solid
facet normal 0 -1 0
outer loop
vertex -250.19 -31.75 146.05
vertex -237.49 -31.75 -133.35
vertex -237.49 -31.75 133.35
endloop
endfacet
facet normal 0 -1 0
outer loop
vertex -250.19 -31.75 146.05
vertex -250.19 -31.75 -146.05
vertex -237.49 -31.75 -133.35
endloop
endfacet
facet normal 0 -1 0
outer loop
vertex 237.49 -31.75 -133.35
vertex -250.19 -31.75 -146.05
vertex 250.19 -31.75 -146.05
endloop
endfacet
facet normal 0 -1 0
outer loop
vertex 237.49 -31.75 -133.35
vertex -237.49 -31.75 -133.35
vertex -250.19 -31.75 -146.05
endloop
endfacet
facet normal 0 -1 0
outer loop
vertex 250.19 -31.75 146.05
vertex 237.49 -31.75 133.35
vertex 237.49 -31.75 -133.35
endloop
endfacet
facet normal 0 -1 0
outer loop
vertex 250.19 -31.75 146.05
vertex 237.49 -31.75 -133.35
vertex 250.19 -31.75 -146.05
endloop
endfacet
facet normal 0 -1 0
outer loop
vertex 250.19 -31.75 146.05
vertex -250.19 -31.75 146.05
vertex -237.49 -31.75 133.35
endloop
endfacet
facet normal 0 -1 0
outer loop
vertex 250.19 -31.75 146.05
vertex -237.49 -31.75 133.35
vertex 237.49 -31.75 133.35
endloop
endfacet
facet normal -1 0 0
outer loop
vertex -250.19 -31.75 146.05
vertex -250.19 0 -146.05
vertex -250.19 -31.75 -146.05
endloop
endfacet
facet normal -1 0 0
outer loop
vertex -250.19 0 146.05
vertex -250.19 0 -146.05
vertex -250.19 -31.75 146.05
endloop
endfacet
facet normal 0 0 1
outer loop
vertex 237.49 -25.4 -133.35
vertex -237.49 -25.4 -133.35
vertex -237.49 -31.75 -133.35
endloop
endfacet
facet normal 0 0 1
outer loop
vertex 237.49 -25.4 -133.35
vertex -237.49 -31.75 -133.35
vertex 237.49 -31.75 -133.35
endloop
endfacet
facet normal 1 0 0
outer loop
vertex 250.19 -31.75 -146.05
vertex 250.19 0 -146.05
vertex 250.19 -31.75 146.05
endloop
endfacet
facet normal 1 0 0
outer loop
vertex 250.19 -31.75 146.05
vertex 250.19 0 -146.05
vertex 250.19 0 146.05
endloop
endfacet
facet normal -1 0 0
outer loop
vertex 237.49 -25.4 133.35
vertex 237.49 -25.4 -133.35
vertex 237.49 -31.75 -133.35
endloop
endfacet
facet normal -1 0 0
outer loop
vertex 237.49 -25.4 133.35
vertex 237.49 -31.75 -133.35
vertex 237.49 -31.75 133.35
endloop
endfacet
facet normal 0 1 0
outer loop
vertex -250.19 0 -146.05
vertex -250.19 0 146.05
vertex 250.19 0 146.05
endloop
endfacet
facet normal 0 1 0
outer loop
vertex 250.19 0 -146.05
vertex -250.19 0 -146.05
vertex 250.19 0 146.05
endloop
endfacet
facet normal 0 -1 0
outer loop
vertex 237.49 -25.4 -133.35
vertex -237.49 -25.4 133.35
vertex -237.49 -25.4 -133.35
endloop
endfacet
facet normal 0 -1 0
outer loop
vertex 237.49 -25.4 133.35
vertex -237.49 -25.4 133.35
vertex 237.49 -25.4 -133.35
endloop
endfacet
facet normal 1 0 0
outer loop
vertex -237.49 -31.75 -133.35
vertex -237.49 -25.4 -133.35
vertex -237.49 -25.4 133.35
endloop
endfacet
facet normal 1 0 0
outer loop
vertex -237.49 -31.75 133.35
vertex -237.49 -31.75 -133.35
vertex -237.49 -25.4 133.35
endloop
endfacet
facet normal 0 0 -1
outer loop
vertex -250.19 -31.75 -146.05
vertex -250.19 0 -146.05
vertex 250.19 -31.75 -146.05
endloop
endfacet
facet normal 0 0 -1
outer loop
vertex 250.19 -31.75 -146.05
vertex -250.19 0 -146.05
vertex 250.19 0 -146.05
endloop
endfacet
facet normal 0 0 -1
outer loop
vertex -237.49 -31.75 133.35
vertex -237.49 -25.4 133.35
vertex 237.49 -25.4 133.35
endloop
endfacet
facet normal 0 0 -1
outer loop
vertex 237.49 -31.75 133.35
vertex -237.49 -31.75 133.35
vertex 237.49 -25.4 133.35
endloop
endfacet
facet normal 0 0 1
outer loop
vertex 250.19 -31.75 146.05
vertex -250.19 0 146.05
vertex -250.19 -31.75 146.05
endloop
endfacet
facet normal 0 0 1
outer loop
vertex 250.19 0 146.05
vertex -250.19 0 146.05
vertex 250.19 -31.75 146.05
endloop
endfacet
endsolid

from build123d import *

# Parameters (mm, degrees)
F0_W     = 474.98
F0_H     = 266.7
F1_DEPTH = 25.4
F2_W     = 500.38
F2_H     = 292.1
F2_W_2   = 474.98
F2_H_2   = 266.7
F3_DEPTH = 31.75


with BuildPart() as f1:
    # F0 (on Front) → F1 (new body)
    with BuildSketch(Plane.XZ):
        Rectangle(F0_W, F0_H)
    extrude(amount=F1_DEPTH)

    # F2 (on Front) → F3 (join)
    with BuildSketch(Plane.XZ):
        Rectangle(F2_W, F2_H)
        Rectangle(F2_W_2, F2_H_2, mode=Mode.SUBTRACT)
    extrude(amount=F3_DEPTH)


solid = f1.part
